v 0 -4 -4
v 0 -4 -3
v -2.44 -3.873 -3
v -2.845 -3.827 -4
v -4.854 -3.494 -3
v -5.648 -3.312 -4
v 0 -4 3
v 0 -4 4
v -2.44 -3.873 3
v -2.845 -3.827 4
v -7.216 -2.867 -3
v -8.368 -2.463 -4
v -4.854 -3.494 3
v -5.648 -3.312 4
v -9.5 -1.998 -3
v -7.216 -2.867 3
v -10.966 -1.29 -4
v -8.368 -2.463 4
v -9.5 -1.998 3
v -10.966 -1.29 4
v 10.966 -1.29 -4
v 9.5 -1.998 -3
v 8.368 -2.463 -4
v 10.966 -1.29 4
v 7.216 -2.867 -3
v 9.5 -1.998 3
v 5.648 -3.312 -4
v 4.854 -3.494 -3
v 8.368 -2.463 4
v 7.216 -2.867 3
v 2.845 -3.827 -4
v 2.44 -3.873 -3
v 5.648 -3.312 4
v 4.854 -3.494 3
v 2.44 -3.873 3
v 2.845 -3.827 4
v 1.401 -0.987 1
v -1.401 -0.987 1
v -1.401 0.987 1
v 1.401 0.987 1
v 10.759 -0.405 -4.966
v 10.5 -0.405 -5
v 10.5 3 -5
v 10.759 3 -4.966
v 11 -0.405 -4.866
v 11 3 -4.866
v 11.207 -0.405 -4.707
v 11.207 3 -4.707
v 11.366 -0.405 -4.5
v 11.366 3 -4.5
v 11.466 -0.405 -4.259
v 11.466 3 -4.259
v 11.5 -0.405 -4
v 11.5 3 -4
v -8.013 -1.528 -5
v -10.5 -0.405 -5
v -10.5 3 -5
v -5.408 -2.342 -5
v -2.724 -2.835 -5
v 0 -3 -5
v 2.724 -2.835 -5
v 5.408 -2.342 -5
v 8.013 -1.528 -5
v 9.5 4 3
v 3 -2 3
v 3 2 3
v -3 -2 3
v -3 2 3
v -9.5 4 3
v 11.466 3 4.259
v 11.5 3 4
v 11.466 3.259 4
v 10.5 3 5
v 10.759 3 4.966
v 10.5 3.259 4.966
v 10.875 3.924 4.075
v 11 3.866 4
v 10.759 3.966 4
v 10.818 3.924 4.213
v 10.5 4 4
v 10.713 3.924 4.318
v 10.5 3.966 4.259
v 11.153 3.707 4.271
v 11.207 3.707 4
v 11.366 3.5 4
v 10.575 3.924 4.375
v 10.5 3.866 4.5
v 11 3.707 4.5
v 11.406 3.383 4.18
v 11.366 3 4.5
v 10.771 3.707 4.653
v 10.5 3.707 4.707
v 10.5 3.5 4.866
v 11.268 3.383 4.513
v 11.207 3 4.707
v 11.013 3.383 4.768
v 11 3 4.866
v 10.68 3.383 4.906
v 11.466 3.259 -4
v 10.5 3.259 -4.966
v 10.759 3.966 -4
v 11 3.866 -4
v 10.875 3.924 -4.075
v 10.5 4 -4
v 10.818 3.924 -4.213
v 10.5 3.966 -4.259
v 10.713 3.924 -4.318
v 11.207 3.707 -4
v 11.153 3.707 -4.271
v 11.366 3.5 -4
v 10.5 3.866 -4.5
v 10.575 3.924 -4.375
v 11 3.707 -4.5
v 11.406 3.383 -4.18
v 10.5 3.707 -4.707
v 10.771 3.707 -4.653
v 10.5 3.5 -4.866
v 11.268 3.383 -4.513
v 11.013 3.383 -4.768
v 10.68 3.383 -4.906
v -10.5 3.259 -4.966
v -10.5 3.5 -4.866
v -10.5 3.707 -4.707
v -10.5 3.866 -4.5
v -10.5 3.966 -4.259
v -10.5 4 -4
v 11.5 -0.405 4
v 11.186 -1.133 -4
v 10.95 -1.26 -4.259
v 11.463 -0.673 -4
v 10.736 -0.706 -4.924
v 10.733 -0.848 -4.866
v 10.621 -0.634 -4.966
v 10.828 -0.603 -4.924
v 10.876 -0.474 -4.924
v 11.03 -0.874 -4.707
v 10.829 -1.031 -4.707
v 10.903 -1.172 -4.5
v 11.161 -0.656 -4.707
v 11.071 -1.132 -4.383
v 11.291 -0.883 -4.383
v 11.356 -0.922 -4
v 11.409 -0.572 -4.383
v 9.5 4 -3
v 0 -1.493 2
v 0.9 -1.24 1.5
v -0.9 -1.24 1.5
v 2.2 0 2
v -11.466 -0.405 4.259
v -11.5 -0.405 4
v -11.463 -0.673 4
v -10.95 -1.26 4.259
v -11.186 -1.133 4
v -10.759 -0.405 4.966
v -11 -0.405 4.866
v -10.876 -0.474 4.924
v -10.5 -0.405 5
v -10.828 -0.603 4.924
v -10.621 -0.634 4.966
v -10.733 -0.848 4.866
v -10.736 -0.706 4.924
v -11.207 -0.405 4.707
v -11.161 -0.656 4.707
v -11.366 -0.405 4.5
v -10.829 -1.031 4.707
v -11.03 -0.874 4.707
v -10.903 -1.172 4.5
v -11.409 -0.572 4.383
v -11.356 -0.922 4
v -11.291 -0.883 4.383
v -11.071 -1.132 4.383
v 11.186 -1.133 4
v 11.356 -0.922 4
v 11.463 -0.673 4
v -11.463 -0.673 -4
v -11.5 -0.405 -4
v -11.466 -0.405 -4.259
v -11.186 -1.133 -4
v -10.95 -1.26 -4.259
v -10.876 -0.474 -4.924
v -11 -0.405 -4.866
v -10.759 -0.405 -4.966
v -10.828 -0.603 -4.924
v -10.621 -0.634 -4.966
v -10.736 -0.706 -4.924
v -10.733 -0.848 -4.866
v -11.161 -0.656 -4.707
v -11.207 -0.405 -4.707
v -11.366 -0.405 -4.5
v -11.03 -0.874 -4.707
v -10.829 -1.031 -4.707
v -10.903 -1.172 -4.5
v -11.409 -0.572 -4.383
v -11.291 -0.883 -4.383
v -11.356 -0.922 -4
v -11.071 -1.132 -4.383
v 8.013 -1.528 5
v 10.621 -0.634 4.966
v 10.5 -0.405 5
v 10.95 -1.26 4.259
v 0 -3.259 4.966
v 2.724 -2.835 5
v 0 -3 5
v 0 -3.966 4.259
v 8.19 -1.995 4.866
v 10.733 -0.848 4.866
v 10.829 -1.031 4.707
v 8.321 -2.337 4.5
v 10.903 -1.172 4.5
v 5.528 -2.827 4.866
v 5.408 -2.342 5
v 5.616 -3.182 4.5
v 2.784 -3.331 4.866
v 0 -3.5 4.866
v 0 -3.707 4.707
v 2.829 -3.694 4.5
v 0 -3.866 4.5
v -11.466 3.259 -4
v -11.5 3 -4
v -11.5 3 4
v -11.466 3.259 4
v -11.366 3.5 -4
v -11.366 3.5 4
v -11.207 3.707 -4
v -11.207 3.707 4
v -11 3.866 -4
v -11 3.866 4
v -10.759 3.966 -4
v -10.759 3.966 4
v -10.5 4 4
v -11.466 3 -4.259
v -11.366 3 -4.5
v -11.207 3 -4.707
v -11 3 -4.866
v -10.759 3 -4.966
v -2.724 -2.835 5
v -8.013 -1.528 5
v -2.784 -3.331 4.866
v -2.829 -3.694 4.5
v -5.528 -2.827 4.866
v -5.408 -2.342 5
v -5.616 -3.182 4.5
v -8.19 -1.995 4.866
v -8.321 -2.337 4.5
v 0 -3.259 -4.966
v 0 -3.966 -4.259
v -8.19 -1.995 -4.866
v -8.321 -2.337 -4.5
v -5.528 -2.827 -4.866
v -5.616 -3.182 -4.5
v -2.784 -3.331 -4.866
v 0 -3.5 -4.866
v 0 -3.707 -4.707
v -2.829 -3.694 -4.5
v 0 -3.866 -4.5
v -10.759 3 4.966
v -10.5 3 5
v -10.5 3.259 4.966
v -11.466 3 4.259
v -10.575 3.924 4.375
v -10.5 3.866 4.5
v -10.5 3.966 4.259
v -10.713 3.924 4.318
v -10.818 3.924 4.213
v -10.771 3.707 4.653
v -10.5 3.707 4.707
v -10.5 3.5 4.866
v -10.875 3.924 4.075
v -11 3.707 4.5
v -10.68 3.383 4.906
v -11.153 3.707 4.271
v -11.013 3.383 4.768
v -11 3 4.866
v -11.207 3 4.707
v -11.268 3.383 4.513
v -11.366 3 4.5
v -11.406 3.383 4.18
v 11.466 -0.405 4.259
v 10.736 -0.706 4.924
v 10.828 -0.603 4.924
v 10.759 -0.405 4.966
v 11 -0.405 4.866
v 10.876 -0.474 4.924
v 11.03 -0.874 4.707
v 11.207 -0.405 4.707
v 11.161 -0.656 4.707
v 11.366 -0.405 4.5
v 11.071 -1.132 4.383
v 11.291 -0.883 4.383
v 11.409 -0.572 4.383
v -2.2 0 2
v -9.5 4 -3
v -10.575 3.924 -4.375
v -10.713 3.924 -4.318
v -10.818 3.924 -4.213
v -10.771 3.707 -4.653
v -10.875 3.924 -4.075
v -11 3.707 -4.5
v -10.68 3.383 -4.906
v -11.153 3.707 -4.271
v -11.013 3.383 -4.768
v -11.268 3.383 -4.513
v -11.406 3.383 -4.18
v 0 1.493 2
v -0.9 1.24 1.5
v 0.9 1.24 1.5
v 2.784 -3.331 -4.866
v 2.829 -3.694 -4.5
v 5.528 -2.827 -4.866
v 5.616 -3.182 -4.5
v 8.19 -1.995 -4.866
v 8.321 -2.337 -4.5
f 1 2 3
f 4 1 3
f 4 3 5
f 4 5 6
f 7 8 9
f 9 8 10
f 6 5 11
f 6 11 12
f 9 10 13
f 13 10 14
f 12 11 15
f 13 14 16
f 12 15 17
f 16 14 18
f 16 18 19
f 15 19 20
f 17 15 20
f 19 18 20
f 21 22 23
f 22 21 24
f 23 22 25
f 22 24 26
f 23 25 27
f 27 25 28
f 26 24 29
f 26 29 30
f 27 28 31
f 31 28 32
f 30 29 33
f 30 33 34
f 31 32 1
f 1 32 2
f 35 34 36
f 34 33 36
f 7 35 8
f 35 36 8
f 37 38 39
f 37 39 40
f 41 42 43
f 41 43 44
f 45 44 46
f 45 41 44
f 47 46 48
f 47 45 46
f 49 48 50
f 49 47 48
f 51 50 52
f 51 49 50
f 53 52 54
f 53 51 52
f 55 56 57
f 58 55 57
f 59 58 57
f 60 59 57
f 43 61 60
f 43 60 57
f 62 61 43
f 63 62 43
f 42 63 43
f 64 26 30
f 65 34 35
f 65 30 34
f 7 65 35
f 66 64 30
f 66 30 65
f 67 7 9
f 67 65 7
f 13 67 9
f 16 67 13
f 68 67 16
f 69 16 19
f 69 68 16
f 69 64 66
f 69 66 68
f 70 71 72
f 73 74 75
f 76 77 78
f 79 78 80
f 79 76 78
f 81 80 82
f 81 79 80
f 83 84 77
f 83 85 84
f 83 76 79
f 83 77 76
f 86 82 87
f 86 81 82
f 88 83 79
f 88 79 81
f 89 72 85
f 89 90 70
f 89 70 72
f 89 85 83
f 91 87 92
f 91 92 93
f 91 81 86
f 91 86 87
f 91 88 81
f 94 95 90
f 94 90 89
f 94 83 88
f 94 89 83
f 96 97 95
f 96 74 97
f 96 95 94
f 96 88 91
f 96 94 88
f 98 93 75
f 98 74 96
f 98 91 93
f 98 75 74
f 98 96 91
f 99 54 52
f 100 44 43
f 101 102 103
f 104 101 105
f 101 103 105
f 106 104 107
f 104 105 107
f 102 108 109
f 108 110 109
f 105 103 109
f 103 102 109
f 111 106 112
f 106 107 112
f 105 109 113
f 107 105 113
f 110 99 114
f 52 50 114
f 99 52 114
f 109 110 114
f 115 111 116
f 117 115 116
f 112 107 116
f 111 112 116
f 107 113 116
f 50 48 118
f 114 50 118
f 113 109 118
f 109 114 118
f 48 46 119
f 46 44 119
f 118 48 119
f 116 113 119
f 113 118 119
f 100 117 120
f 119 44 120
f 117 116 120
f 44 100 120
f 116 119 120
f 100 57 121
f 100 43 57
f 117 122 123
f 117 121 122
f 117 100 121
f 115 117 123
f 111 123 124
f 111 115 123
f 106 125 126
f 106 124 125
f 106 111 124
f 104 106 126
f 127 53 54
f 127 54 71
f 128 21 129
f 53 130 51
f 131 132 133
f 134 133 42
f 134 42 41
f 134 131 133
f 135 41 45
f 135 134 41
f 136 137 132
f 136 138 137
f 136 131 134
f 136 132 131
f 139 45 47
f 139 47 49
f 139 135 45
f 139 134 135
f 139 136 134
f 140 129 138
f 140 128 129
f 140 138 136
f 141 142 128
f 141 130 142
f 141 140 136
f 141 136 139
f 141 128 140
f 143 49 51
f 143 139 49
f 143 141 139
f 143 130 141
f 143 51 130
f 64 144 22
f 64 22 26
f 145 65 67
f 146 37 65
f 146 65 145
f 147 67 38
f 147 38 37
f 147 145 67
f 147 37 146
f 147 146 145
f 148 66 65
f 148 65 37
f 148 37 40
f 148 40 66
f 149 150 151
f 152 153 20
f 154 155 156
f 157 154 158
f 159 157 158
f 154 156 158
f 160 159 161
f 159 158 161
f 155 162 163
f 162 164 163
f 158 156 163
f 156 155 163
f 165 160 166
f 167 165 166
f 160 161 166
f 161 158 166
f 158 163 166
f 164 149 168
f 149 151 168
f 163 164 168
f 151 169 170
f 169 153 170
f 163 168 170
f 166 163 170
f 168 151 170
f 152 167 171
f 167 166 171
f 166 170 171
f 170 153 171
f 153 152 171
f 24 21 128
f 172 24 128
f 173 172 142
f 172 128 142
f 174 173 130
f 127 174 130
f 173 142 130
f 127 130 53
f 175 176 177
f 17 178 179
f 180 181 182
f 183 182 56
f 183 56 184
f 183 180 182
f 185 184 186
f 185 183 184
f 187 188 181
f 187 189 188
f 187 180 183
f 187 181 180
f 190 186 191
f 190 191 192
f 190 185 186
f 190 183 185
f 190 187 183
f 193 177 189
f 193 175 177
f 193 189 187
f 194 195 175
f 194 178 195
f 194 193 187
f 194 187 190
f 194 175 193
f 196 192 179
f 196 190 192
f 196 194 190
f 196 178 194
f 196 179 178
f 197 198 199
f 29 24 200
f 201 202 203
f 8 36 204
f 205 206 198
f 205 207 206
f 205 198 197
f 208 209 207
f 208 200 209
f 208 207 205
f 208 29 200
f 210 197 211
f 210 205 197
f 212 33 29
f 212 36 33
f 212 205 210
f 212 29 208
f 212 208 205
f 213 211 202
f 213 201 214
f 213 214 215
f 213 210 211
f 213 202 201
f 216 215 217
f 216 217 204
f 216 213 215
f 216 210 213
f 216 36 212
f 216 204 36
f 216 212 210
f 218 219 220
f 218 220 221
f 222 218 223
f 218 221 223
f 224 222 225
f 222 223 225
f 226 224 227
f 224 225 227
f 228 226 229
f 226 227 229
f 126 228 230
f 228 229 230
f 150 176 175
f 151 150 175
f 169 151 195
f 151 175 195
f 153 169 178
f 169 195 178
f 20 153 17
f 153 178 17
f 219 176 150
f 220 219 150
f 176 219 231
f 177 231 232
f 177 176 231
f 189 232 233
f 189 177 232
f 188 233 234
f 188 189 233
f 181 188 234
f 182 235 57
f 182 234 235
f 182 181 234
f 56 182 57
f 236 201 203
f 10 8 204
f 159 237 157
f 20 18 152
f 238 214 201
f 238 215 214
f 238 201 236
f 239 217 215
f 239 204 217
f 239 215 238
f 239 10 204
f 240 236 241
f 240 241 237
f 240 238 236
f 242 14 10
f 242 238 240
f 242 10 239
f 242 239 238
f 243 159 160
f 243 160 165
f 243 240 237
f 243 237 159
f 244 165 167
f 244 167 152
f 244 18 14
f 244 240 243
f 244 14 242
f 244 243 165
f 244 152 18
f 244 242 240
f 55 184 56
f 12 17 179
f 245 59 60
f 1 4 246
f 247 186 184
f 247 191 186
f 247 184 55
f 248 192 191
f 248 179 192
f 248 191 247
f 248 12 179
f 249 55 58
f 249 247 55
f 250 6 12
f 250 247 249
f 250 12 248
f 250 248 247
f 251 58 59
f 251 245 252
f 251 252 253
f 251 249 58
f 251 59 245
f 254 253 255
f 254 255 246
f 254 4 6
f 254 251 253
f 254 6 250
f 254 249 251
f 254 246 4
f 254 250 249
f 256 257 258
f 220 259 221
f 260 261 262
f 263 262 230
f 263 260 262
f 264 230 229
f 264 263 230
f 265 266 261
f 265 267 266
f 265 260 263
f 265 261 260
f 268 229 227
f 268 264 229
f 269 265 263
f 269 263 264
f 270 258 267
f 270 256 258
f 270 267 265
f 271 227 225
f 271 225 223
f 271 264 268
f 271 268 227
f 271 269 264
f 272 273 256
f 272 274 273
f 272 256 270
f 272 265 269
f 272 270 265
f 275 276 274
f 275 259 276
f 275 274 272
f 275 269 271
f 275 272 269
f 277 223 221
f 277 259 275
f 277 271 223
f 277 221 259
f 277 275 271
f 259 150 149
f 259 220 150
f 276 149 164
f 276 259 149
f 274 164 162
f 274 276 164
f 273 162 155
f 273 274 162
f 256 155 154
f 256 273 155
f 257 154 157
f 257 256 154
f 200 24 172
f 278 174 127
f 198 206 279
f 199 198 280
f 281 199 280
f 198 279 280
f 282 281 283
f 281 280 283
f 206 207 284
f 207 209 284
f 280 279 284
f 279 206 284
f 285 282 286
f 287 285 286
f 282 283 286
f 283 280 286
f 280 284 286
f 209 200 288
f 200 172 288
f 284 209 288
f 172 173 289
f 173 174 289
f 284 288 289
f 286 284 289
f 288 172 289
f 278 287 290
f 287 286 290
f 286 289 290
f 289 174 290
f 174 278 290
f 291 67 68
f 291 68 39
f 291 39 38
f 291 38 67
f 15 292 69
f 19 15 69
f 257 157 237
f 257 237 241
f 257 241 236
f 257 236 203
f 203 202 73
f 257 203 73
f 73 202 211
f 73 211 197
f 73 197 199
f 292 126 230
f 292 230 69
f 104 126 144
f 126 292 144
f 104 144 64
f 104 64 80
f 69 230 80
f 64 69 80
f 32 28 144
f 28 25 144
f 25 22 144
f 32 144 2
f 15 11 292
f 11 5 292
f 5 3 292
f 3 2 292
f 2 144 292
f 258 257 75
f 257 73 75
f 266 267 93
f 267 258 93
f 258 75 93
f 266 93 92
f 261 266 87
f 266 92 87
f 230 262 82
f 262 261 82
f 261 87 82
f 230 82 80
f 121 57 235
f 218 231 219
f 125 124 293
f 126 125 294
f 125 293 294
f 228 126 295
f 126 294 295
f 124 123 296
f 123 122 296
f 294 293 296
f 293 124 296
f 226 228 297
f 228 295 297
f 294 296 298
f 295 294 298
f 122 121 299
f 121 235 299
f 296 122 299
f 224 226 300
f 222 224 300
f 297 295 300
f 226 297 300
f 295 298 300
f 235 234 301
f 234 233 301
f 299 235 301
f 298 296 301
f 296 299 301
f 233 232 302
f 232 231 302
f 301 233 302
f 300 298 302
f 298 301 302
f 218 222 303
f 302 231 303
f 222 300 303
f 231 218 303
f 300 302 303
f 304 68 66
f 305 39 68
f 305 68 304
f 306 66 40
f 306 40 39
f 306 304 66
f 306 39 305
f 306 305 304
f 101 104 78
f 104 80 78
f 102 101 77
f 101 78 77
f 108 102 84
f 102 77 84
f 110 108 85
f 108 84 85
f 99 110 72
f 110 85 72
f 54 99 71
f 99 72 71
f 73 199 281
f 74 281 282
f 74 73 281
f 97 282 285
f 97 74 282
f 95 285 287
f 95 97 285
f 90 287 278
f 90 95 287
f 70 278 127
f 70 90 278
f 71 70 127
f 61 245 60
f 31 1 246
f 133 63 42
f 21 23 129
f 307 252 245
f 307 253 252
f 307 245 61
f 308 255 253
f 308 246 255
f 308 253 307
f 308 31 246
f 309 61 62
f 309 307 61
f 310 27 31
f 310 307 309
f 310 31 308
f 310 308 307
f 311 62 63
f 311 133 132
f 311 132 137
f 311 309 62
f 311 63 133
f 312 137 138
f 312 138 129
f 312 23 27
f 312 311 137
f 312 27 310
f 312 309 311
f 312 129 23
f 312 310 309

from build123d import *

# Parameters (mm, degrees)
F0_W     = 23
F0_H     = 10
F1_DEPTH = 4
F3_DEPTH = 10.001
F4_W     = 19
F4_H     = 6
F5_DEPTH = 8.001
F6_W     = 6
F6_H     = 4
F8_W     = 2.8015887365
F8_H     = 1.9735014066
F11_R    = 1


# Not quite as in the source:
# - a feature of the source that left no trace in its solid (it failed there, or was rolled back) is left out


with BuildPart() as f1:
    # F0 (on Front) → F1 (new body, symmetric)
    with BuildSketch(Plane.XZ):
        Rectangle(F0_W, F0_H)
    extrude(amount=F1_DEPTH, both=True)

    # F2 (on face) → F3 (cut, through all)
    with BuildSketch(Plane.XY.offset(5)):
        with BuildLine():
            ThreePointArc((-6.62e-08, -4), (-5.9424321941, -3.2376566126), (-11.5, -1))
            Line((-11.5, -1), (-11.5, -4))
            Line((-11.5, -4), (-6.62e-08, -4))
        make_face()
        with BuildLine():
            ThreePointArc((11.5, -1), (5.94243213, -3.2376566294), (-6.62e-08, -4))
            Line((-6.62e-08, -4), (11.5, -4))
            Line((11.5, -4), (11.5, -1))
        make_face()
    extrude(amount=-F3_DEPTH, mode=Mode.SUBTRACT)

    # F4 (on face) → F5 (cut, through all)
    with BuildSketch(Plane(origin=(0, 4, 0), x_dir=(-1, 0, 0), z_dir=(0, 1, 0))):
        Rectangle(F4_W, F4_H)
    extrude(amount=-F5_DEPTH, mode=Mode.SUBTRACT)

    # F6 (on face) → F9 section 0
    with BuildSketch(Plane(origin=(0, 0, 3), x_dir=(1, 0, 0), z_dir=(0, 0, -1))):
        Rectangle(F6_W, F6_H)
    # F8 (on offset) → F9 section 1
    with BuildSketch(Plane(origin=(0, 0, 1), x_dir=(1, 0, 0), z_dir=(0, 0, -1))):
        Rectangle(F8_W, F8_H)
    loft()

    # F11
    f11_edges = [f1.edges().sort_by_distance(p)[0] for p in [
        (11.5, 1.5, -5),
        (-11.5, 1.5, -5),
        (11.5, 1.5, 5),
        (-11.5, 1.5, 5),
        (11.5, -1, 0),
        (11.5, 4, 0),
        (0, 4, -5),
        (0, -4, -5),
        (0, -4, 5),
        (-11.5, -1, 0),
        (0, 4, 5),
        (-11.5, 4, 0),
    ]]
    fillet(f11_edges, radius=F11_R)


solid = f1.part
